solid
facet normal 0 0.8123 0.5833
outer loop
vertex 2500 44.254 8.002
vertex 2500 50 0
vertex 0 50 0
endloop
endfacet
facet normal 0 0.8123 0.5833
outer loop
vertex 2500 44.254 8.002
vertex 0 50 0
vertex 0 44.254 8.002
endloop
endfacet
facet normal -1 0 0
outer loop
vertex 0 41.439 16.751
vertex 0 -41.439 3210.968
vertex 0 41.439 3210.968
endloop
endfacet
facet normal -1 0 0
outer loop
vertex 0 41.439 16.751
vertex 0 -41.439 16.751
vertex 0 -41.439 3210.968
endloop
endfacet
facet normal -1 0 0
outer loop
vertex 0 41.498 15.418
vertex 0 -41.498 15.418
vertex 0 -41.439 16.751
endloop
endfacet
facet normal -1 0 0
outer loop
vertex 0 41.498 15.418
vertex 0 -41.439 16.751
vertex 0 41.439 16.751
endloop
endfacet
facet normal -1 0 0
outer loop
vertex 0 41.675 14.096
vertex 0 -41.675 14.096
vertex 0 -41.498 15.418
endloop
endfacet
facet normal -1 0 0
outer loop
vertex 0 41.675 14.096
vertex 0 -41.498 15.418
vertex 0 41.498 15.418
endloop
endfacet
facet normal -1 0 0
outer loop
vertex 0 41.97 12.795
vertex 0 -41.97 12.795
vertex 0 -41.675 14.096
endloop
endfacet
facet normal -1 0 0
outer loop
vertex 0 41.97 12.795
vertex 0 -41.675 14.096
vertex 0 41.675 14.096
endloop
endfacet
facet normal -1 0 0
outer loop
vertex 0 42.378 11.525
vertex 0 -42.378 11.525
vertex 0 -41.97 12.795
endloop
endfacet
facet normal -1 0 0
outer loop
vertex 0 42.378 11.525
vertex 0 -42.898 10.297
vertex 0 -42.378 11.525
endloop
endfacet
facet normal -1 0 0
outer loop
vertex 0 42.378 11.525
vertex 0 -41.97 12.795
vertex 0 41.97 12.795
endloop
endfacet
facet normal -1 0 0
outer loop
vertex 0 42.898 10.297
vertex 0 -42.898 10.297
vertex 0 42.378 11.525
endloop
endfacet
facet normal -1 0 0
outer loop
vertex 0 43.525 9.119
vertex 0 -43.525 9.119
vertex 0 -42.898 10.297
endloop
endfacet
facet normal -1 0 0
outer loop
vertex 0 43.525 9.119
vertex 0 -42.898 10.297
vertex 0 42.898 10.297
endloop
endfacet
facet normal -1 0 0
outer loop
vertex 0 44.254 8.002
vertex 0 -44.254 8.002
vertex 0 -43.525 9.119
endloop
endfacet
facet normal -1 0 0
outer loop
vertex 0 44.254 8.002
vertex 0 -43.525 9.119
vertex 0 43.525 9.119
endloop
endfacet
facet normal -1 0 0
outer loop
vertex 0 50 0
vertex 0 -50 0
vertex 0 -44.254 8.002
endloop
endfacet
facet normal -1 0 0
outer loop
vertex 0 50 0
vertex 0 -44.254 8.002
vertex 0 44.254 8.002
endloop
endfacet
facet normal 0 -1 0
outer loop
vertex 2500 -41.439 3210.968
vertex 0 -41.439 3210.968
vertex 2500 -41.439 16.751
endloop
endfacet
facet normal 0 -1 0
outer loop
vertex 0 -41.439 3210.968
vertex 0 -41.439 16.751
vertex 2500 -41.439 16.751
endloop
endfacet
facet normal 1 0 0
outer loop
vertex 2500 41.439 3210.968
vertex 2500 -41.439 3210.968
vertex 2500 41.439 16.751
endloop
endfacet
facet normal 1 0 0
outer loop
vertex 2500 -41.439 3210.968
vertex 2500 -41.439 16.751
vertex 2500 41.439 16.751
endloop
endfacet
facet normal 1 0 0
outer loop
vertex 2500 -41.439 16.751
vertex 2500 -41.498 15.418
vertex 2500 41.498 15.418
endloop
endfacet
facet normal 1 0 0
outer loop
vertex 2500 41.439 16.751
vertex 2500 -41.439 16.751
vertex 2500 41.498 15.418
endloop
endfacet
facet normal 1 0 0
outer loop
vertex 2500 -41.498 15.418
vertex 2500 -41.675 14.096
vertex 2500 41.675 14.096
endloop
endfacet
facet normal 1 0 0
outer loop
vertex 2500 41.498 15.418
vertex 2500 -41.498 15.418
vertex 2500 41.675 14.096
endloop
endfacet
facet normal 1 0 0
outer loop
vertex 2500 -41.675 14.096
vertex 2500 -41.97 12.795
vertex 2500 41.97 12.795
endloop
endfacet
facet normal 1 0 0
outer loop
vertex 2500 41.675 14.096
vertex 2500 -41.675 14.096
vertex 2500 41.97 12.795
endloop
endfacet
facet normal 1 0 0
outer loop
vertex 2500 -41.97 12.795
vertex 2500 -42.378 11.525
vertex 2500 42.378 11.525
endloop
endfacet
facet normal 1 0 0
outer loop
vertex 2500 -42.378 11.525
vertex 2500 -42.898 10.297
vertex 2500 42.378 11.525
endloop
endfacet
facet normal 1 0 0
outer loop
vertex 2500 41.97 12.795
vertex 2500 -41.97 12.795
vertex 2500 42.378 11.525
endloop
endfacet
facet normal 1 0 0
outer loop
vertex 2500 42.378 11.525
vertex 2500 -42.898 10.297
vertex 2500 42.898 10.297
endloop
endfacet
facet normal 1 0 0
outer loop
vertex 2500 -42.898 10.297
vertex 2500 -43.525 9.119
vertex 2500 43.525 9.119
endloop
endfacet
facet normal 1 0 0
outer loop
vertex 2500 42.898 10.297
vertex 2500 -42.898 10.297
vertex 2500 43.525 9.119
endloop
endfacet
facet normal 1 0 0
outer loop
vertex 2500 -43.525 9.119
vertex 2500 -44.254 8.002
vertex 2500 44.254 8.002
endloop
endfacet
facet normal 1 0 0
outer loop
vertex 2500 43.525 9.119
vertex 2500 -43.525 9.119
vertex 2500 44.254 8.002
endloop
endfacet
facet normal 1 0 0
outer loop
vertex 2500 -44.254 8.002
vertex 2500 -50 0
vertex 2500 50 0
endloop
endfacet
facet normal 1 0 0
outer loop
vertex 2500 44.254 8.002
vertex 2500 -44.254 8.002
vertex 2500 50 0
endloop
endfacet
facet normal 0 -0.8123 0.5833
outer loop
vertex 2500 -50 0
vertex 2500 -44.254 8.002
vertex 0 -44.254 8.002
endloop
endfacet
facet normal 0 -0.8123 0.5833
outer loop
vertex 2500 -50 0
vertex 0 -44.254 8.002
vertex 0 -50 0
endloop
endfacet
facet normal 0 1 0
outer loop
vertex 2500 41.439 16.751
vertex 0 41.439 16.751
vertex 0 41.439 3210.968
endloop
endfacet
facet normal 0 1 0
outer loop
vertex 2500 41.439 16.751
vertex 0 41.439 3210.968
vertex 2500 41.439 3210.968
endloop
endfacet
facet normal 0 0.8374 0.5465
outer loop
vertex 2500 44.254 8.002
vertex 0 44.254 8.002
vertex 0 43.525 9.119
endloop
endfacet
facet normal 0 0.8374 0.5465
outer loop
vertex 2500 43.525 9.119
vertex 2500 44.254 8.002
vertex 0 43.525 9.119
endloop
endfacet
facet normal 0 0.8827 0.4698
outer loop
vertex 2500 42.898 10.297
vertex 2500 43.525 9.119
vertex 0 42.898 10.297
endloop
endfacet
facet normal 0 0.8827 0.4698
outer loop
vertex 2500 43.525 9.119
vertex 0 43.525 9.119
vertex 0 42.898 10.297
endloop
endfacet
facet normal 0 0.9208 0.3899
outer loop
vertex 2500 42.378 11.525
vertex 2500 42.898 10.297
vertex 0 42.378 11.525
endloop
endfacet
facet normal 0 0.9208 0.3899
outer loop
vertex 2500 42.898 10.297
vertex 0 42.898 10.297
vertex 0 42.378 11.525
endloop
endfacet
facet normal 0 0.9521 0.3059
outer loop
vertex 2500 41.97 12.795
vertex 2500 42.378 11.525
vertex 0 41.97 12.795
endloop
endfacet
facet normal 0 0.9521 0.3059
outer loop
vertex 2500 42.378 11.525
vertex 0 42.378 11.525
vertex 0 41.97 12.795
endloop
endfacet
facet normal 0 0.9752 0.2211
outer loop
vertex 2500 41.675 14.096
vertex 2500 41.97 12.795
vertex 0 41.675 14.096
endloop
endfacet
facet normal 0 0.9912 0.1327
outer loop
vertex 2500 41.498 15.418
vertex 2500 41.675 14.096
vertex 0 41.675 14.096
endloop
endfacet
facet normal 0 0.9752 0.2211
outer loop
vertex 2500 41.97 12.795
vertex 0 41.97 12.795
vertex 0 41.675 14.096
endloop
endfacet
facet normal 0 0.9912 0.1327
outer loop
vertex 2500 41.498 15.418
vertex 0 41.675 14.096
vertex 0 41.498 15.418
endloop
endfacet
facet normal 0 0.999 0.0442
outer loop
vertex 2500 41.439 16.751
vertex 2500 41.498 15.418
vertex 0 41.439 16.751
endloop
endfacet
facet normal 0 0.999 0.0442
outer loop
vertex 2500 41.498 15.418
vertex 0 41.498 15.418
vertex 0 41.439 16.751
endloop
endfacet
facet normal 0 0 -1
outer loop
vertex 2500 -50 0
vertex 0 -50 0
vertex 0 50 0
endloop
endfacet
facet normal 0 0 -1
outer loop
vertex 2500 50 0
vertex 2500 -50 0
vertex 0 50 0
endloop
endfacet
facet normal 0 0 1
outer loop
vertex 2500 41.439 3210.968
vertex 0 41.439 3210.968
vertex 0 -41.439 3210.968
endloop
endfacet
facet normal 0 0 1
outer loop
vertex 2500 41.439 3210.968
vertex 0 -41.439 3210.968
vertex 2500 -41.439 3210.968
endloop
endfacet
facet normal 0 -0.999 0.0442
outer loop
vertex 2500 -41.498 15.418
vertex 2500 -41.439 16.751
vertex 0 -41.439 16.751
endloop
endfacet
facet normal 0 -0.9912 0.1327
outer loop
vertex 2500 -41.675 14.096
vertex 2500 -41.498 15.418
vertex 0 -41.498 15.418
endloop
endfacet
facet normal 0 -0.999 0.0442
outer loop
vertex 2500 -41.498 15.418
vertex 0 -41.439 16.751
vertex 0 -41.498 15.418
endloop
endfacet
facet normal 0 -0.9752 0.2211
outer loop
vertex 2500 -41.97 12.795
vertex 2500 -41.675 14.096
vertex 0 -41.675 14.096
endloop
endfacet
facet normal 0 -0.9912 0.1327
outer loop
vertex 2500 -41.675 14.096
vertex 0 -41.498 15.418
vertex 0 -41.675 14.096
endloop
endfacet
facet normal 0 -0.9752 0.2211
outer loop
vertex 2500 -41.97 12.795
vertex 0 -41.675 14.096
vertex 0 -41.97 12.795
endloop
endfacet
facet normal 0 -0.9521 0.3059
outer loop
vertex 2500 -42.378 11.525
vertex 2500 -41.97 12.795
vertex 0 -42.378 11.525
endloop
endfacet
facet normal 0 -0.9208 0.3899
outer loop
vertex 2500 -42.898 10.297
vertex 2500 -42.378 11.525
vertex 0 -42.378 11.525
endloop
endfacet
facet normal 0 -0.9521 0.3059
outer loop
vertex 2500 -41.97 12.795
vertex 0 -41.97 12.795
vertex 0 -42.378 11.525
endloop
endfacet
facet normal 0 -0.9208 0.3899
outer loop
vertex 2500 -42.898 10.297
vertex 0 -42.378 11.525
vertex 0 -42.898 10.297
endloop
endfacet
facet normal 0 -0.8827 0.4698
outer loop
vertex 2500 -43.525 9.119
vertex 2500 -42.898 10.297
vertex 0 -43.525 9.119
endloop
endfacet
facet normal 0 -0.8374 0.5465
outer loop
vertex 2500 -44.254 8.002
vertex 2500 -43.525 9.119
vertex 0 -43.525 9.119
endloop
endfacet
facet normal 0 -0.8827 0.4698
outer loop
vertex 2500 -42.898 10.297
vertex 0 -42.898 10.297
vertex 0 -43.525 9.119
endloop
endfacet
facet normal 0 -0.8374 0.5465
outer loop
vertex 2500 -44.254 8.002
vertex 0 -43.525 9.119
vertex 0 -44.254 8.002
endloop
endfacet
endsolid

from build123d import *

# Parameters (mm, degrees)
F1_DEPTH  = 2500
F1_FACE_W = 2500
F1_FACE_H = 82.877408
F2_DEPTH  = 3110


with BuildPart() as f1:
    # F0 (on Right) → F1 (new body)
    with BuildSketch(Plane.YZ):
        with BuildLine():
            Line((-50, 0), (0, 0))
            Line((0, 0), (0, 100.967504))
            Line((0, 100.967504), (-41.438704, 100.967504))
            Line((-41.438704, 100.967504), (-41.438704, 16.750849))
            ThreePointArc((-41.438704, 16.750849), (-42.159935, 12.155549), (-44.254274, 8.002153))
            Line((-44.254274, 8.002153), (-50, 0))
        make_face()
        with BuildLine():
            Line((0, 100.967504), (0, 0))
            Line((0, 0), (50, 0))
            Line((50, 0), (44.254274, 8.002153))
            ThreePointArc((44.254274, 8.002153), (42.159935, 12.155549), (41.438704, 16.750849))
            Line((41.438704, 16.750849), (41.438704, 100.967504))
            Line((41.438704, 100.967504), (0, 100.967504))
        make_face()
    extrude(amount=F1_DEPTH)

    # F1_face (on face) → F2 (join)
    with BuildSketch(Plane(origin=(1250, 0, 100.967504), x_dir=(1, 0, 0), z_dir=(0, 0, 1))):
        Rectangle(F1_FACE_W, F1_FACE_H)
    extrude(amount=F2_DEPTH)


solid = f1.part
